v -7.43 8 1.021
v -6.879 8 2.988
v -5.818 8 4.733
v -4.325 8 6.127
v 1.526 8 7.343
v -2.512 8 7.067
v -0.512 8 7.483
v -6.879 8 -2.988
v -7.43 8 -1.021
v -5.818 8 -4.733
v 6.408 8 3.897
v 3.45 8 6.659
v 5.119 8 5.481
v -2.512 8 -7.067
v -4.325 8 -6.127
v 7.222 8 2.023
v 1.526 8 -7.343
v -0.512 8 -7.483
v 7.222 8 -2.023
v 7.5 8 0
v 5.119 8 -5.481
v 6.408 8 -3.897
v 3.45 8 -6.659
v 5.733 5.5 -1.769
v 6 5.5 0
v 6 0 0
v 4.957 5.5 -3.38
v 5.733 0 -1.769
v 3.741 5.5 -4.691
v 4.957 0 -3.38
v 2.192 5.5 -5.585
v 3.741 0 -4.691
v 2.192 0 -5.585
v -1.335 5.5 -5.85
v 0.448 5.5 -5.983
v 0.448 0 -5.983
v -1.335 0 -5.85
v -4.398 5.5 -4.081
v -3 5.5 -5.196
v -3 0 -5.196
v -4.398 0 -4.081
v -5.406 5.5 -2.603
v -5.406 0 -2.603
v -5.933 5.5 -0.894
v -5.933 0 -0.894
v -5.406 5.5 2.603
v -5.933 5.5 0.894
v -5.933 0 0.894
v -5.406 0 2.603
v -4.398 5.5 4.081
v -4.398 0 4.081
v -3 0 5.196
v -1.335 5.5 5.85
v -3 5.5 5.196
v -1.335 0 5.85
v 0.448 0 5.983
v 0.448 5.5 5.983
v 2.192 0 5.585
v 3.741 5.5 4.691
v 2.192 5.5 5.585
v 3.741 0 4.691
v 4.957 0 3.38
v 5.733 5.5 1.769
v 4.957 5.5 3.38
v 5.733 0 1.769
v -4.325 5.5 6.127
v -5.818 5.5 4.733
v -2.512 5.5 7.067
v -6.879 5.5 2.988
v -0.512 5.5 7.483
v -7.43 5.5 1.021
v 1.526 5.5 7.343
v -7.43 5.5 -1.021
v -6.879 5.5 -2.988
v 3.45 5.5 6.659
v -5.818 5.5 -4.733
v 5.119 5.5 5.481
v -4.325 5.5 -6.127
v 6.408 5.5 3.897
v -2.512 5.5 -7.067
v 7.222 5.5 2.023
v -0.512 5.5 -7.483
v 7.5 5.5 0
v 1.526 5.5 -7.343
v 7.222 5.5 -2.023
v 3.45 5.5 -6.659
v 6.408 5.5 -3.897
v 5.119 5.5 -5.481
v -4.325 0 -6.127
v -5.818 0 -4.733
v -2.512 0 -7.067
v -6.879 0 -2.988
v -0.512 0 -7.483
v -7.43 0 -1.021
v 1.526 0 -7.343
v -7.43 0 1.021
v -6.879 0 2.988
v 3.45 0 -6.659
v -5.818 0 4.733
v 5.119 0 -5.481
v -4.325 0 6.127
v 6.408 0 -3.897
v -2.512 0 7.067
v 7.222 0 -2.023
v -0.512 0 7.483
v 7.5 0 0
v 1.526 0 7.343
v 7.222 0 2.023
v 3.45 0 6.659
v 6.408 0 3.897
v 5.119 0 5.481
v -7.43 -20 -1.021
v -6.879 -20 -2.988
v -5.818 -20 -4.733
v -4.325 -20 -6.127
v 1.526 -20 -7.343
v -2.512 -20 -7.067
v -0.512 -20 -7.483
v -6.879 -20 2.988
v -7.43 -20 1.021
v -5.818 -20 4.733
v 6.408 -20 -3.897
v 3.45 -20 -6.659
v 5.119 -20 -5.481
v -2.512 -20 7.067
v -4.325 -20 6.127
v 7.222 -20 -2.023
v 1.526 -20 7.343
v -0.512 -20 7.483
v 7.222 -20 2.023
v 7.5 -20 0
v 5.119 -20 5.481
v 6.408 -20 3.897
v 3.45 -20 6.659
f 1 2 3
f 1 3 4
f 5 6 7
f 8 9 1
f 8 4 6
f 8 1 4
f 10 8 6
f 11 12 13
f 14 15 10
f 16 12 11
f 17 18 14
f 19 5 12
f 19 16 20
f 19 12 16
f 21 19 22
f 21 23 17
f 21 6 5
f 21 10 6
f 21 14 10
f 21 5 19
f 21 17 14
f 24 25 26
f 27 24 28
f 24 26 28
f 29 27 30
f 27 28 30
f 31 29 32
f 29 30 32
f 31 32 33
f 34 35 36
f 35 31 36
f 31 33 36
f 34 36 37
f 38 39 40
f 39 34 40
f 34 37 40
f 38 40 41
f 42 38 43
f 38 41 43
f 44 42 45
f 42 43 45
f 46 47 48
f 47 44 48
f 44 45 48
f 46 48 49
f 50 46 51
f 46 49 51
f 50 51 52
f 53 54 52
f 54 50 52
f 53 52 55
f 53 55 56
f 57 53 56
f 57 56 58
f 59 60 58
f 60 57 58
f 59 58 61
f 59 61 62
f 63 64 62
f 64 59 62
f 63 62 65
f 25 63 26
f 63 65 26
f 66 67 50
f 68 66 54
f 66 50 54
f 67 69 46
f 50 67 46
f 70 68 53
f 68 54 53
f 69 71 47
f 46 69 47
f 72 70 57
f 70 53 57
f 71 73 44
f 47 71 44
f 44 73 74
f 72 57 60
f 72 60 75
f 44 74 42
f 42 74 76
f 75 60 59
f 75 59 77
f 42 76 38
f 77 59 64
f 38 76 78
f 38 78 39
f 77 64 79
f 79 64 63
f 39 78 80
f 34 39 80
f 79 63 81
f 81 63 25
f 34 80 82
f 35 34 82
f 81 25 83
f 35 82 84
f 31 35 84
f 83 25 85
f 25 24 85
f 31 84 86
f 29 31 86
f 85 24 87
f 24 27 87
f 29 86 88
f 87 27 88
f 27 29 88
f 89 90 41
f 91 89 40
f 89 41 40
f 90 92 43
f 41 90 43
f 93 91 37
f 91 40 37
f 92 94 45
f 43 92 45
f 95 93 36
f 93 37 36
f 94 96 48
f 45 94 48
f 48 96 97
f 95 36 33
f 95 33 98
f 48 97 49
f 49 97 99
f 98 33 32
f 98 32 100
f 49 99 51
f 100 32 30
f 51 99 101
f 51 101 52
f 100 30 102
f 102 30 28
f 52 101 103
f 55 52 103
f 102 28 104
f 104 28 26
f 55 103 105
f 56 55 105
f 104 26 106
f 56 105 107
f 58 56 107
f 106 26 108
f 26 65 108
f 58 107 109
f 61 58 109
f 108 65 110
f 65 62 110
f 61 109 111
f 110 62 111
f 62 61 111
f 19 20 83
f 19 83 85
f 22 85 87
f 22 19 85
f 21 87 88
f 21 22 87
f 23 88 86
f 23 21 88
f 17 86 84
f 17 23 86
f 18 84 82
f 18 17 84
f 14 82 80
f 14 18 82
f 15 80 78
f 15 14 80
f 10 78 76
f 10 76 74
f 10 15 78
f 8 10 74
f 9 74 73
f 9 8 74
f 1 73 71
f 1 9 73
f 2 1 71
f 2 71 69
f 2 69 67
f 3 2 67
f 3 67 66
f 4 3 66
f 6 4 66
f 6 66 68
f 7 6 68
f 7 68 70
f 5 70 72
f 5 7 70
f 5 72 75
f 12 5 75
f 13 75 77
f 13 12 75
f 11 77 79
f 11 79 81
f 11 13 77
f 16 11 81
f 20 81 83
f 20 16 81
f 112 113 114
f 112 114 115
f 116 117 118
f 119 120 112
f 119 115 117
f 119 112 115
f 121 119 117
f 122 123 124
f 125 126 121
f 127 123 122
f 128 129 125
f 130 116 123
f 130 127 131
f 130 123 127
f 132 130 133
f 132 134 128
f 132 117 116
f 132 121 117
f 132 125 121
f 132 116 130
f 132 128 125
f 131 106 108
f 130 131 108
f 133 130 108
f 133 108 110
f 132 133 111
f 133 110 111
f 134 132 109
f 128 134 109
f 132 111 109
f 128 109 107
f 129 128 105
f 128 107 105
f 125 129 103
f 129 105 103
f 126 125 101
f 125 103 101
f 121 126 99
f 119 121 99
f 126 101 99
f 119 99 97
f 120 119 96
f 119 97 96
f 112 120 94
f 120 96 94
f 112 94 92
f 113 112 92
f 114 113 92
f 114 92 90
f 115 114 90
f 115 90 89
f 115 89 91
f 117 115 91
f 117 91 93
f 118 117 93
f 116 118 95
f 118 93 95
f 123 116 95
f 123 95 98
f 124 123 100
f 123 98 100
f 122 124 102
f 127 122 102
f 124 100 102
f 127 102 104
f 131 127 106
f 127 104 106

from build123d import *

# Parameters (mm, degrees)
SKETCH1_R           = 6
BOSS_EXTRUDE1_DEPTH = 8
SKETCH3_R           = 7.5
BOSS_EXTRUDE2_DEPTH = 20
SKETCH4_R           = 7.5
BOSS_EXTRUDE3_DEPTH = 2.5


with BuildPart() as part:
    # Sketch1 → Boss-Extrude1 (new body)
    with BuildSketch(Plane(origin=(0, 0, 0), x_dir=(1, 0, 0), z_dir=(0, 1, 0))):
        Circle(SKETCH1_R)
    extrude(amount=BOSS_EXTRUDE1_DEPTH)

    # Sketch3 → Boss-Extrude2 (add)
    with BuildSketch(Plane.XZ):
        Circle(SKETCH3_R)
    extrude(amount=BOSS_EXTRUDE2_DEPTH)

    # Sketch4 → Boss-Extrude3 (add)
    with BuildSketch(Plane(origin=(0, 8, 0), x_dir=(1, 0, 0), z_dir=(0, 1, 0))):
        Circle(SKETCH4_R)
    extrude(amount=-BOSS_EXTRUDE3_DEPTH)


solid = part.part
